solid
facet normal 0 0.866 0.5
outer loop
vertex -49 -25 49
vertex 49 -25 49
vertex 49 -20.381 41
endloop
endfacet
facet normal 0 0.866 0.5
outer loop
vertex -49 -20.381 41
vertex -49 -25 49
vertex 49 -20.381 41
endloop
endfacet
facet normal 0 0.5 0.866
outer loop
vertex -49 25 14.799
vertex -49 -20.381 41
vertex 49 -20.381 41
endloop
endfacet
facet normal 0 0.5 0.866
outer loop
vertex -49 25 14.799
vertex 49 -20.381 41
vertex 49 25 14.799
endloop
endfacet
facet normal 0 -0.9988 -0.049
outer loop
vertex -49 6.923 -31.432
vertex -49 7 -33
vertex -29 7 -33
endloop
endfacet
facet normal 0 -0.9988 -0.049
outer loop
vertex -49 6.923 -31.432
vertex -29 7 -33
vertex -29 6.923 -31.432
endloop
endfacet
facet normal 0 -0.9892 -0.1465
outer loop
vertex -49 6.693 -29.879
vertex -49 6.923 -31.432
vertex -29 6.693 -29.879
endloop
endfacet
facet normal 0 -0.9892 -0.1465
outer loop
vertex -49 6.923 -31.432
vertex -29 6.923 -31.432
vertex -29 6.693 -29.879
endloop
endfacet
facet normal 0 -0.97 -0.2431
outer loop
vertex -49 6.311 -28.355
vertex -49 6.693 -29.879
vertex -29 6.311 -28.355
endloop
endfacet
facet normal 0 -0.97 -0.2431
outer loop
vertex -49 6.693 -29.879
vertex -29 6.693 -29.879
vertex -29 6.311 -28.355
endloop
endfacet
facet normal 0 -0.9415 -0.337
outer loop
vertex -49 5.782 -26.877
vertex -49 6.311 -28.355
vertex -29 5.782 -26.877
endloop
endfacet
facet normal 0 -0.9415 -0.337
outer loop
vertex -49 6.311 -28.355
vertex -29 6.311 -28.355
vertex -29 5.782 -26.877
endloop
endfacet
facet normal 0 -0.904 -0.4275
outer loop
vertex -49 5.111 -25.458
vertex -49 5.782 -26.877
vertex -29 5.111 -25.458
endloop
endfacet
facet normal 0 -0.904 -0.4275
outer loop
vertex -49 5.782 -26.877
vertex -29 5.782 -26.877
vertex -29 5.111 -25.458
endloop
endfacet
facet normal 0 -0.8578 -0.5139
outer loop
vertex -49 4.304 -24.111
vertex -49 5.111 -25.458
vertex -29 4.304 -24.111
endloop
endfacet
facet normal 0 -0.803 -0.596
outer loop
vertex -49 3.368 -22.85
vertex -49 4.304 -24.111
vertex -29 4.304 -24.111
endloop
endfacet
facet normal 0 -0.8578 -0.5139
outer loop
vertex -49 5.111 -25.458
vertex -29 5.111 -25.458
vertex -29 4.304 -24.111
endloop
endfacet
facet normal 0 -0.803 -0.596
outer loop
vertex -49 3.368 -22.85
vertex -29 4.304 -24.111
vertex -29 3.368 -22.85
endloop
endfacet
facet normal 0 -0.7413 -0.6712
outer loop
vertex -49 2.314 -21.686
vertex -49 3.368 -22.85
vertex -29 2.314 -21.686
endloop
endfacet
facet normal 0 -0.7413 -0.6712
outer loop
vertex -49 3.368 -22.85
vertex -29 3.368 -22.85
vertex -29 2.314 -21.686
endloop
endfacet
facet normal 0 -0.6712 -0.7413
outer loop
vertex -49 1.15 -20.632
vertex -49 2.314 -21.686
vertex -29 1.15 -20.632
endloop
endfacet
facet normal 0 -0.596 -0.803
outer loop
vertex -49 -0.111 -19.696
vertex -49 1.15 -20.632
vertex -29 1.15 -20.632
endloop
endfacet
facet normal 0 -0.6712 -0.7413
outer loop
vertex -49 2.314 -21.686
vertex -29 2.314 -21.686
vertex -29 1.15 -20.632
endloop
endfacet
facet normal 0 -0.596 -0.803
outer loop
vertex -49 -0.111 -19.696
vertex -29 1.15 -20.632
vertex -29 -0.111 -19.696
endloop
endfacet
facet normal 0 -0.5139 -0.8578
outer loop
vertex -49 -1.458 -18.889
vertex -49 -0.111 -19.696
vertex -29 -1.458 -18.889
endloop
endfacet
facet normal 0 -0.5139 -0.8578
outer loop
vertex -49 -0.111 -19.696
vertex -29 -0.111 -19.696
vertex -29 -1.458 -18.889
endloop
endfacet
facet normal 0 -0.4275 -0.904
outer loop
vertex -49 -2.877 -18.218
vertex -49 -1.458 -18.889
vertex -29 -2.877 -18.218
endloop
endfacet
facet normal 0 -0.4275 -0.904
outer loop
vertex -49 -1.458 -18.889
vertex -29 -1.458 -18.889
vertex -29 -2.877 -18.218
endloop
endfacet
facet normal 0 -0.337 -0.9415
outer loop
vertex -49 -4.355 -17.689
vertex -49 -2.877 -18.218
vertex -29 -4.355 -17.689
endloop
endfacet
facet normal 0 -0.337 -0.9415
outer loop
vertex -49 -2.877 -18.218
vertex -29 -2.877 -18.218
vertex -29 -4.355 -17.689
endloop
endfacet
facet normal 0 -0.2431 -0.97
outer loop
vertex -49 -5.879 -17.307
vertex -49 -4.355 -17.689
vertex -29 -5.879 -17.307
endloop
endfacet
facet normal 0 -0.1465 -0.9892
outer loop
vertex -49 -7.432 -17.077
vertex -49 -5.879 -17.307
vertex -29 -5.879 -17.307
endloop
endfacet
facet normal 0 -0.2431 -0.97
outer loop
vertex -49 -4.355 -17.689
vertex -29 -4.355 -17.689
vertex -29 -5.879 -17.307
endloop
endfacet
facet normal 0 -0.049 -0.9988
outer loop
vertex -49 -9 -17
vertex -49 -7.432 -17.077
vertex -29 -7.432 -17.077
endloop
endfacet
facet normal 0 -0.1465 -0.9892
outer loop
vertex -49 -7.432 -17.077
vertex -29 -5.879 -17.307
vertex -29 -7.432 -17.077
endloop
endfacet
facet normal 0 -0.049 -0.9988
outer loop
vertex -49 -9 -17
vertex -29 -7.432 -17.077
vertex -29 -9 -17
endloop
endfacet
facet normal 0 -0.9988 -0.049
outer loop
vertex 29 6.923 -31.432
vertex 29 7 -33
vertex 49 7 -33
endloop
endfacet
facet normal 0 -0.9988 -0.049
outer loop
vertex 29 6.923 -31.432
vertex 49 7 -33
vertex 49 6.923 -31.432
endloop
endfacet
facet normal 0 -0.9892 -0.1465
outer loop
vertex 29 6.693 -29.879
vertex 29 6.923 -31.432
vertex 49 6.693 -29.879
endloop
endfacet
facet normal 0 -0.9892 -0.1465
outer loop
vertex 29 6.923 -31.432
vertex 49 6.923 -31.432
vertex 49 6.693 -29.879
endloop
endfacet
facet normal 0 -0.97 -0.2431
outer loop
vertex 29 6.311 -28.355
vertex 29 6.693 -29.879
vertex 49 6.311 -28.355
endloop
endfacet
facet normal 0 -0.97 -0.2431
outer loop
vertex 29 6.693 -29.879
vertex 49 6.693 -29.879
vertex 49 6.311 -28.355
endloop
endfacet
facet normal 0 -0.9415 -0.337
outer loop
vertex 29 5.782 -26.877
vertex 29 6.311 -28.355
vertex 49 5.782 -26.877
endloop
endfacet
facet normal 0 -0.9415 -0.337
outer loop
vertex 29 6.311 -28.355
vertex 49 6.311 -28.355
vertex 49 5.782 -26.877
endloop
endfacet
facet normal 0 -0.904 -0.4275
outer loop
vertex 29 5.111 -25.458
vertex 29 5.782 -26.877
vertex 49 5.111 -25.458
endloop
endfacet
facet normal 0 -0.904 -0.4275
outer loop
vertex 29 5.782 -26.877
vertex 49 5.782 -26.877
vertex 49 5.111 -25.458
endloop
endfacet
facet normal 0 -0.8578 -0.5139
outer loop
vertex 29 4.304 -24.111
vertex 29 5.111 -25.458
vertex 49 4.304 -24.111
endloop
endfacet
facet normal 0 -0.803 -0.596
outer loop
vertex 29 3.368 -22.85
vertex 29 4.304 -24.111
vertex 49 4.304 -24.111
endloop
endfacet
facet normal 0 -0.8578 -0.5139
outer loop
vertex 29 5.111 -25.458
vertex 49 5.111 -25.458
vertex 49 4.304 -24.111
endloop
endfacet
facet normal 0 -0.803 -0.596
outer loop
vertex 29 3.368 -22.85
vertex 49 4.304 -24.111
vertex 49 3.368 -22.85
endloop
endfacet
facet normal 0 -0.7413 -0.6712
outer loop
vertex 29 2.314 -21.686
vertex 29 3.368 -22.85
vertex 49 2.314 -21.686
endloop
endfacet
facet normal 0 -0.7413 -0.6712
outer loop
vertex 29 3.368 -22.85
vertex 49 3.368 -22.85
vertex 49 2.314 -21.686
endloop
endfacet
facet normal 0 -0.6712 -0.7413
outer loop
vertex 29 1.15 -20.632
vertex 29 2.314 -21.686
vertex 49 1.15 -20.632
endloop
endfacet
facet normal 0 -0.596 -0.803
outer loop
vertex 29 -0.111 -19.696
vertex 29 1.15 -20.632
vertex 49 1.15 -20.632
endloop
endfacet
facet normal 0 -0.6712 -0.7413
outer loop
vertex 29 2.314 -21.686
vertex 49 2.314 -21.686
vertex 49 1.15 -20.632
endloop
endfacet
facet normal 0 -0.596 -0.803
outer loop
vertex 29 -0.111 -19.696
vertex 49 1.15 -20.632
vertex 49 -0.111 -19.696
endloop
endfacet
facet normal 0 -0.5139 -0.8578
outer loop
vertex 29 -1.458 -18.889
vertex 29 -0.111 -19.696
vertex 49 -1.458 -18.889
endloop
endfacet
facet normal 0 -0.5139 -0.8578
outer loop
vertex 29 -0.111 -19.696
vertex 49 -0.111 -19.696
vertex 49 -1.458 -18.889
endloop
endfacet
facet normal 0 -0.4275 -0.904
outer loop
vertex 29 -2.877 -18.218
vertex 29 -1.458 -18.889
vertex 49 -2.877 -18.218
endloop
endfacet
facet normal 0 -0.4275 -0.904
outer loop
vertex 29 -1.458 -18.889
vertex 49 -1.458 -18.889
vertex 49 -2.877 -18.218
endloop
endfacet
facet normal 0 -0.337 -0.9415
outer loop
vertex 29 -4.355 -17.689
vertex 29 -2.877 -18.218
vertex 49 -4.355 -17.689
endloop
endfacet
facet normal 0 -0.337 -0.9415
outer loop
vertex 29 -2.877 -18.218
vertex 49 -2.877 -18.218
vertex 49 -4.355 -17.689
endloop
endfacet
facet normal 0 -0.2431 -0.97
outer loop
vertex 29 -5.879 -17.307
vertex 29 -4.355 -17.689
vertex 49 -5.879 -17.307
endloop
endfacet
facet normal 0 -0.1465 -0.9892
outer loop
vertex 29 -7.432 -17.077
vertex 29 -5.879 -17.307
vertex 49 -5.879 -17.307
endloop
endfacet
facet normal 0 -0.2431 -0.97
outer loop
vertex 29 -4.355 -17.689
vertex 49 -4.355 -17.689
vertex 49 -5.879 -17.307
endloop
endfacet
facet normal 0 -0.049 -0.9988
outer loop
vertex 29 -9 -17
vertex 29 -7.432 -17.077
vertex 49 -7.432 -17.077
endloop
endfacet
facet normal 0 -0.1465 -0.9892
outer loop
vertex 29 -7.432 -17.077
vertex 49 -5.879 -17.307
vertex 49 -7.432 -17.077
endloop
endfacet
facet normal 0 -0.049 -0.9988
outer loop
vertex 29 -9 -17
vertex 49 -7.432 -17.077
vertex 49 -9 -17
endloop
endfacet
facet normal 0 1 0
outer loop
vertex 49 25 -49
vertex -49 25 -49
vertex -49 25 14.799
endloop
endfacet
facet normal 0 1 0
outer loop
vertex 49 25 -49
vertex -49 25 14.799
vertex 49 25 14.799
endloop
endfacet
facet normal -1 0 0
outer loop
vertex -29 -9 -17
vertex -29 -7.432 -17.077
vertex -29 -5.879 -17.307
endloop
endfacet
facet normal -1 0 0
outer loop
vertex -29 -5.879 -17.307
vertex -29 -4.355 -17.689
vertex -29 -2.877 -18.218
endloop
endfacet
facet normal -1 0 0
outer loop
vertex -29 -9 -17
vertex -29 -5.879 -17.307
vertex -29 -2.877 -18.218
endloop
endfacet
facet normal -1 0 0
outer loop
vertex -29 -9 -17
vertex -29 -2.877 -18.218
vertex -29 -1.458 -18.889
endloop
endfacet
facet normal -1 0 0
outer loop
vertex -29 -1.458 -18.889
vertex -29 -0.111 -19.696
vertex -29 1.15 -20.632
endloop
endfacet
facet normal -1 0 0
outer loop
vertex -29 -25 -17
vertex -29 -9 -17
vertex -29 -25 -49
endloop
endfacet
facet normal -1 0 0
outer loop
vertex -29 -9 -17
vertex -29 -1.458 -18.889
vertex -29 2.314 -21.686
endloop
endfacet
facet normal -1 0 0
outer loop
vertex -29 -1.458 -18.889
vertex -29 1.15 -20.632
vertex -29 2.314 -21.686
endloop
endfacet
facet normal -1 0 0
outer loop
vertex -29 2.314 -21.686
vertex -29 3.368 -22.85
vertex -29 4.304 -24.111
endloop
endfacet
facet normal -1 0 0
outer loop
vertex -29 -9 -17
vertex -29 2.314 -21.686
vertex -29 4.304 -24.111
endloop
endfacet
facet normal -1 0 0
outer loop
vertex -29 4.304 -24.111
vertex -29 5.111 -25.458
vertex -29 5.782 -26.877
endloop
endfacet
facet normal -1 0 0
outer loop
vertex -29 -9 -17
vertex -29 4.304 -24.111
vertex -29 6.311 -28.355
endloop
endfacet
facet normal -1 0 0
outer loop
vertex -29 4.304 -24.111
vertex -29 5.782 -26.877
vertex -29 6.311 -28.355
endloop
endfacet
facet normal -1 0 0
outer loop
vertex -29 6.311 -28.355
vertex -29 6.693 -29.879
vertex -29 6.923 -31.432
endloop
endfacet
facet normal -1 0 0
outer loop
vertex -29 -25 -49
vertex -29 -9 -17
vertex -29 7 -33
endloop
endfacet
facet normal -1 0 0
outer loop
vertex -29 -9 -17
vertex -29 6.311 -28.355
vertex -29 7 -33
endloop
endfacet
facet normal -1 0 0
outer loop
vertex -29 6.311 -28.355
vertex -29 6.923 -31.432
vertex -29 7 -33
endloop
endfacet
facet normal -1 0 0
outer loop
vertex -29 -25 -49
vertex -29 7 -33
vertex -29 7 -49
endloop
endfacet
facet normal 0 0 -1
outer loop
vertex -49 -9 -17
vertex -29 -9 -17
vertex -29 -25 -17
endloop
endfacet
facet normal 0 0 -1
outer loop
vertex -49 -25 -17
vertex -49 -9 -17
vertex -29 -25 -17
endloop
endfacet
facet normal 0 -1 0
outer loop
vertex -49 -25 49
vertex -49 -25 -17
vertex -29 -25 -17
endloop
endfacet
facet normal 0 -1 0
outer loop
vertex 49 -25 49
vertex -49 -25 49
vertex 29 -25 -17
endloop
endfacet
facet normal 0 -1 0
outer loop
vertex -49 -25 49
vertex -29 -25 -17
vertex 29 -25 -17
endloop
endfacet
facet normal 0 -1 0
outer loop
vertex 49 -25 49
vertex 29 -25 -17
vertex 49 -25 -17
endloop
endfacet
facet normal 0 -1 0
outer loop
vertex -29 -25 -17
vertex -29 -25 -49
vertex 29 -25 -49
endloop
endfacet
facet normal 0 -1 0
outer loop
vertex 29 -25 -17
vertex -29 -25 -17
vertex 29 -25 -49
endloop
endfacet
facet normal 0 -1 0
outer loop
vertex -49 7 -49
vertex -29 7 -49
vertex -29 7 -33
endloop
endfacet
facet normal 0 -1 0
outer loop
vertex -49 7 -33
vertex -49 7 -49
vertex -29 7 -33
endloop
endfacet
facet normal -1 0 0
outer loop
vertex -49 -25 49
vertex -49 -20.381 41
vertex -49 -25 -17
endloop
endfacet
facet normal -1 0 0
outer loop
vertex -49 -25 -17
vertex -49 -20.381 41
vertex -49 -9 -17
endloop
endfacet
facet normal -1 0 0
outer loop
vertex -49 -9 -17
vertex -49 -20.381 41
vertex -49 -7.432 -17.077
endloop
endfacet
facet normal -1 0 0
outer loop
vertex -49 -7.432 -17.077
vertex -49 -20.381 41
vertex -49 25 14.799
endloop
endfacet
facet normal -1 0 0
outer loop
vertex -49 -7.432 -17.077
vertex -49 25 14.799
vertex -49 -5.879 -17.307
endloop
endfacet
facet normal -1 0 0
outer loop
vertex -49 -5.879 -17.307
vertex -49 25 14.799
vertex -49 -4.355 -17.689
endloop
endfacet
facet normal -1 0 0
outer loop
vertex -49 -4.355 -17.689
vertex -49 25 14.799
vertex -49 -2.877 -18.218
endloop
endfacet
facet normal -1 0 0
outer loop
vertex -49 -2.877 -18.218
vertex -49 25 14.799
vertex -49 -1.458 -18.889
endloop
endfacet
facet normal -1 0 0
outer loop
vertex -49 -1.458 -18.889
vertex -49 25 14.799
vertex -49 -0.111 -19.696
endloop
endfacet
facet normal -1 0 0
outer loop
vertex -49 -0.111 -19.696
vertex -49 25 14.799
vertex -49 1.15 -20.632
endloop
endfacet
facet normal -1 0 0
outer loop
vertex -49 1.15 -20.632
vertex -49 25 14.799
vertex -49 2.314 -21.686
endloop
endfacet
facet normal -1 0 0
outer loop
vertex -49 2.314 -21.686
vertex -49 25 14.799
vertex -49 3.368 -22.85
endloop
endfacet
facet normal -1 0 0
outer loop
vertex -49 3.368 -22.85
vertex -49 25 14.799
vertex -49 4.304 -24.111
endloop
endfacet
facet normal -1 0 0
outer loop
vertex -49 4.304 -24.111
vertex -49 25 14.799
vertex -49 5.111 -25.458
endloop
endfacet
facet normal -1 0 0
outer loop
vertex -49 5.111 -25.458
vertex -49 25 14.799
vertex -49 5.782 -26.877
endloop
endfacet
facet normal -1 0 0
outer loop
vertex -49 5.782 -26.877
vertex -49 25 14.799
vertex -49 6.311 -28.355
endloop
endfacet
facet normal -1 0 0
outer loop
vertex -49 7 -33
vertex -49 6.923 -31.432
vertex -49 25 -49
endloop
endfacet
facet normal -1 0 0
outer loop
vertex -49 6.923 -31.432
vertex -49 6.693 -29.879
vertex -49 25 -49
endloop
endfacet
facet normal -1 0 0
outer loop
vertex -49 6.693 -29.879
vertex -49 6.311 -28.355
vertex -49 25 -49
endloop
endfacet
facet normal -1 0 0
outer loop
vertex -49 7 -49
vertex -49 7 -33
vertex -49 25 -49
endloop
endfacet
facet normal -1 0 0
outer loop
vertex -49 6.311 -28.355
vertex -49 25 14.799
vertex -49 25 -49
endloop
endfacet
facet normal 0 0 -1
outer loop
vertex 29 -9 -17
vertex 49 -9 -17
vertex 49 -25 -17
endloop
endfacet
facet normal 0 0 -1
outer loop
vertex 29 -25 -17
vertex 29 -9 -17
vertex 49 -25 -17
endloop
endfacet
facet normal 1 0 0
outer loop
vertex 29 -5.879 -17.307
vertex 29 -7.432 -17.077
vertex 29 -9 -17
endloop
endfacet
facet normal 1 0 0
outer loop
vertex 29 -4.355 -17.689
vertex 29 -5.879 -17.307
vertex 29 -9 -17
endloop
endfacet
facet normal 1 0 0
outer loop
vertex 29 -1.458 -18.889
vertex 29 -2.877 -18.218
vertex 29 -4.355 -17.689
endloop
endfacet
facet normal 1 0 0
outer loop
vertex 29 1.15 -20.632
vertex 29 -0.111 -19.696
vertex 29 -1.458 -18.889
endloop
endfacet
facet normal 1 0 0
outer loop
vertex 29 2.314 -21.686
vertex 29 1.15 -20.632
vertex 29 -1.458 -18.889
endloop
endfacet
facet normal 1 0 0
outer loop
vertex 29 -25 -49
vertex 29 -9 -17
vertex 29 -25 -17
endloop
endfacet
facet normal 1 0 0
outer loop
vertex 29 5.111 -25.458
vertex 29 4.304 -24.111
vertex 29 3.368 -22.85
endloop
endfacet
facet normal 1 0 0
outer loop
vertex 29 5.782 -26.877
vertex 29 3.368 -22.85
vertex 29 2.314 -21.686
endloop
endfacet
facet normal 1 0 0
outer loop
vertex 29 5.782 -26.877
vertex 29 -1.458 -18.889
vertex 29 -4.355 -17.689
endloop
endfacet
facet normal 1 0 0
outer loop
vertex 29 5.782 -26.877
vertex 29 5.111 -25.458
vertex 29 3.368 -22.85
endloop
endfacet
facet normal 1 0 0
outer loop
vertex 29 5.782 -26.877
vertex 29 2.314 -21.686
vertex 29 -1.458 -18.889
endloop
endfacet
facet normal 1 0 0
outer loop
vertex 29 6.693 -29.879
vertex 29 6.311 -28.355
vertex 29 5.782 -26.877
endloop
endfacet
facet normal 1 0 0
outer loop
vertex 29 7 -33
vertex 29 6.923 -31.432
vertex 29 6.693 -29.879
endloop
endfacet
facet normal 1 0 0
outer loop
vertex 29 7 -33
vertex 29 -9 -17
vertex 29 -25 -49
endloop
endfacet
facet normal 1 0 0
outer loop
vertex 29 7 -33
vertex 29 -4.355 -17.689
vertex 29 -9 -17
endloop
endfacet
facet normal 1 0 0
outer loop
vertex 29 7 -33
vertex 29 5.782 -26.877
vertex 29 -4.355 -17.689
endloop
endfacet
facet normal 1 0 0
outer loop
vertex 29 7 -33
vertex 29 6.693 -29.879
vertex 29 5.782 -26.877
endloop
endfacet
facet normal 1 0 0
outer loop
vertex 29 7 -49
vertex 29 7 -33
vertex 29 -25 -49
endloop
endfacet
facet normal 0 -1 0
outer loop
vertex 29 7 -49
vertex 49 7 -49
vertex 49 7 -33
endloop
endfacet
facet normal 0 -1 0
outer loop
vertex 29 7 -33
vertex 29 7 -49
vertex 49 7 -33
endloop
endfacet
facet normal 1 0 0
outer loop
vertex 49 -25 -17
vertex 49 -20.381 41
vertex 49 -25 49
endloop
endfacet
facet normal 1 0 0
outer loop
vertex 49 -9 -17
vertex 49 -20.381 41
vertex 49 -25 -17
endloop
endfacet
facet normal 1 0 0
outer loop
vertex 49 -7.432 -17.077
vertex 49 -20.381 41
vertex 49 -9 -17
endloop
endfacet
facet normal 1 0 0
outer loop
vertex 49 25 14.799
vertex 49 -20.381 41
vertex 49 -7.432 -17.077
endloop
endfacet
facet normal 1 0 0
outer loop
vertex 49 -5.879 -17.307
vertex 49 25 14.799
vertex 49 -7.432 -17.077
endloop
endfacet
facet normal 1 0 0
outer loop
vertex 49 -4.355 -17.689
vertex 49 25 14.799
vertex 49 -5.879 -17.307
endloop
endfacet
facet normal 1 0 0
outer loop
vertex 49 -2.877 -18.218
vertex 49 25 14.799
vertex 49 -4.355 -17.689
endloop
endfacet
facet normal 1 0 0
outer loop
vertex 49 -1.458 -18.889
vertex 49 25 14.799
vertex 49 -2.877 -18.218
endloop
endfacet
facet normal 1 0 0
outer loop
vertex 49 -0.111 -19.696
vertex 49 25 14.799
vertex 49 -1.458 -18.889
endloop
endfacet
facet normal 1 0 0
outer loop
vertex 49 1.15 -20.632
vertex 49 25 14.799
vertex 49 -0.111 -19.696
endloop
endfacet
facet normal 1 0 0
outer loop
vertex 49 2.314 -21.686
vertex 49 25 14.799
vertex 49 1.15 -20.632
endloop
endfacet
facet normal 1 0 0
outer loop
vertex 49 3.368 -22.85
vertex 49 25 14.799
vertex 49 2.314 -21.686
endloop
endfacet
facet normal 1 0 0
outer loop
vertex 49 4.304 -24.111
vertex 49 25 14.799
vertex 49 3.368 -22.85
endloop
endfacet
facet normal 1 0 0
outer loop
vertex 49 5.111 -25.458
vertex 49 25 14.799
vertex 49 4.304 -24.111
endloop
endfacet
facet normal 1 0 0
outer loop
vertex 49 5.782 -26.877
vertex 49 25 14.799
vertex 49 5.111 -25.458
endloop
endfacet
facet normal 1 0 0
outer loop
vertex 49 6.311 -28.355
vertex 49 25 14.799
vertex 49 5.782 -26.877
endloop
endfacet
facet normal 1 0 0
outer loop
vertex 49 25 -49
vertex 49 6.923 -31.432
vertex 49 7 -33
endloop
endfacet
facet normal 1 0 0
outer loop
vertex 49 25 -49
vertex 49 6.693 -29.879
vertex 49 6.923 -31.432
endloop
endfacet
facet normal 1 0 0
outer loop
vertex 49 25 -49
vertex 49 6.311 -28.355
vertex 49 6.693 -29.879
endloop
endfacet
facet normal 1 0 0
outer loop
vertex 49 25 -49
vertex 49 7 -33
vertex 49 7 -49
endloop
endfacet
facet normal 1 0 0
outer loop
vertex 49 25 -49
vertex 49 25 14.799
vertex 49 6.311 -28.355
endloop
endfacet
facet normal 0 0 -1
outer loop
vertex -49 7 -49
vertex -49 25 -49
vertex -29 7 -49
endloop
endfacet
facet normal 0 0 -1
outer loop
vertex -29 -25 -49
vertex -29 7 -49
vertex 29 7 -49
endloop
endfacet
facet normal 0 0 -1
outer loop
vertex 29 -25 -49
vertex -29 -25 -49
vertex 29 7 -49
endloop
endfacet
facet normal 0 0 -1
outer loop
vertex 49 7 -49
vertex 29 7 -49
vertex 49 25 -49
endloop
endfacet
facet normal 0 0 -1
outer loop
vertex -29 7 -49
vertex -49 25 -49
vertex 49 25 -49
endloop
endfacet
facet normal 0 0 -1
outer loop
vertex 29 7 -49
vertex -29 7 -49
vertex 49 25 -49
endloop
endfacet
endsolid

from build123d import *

# Parameters (mm, degrees)
ESBO_O1_W                  = 98
ESBO_O1_H                  = 98
RESSALTO_EXTRUS_O1_DEPTH   = 25
CORTE_EXTRUS_O4_DEPTH      = 74.668174947
CORTE_EXTRUS_O4_DEPTH_BACK = 74.668174947
CORTE_EXTRUS_O10_START     = 49
CORTE_EXTRUS_O10_DEPTH     = 20
CORTE_EXTRUS_O11_START     = -29
CORTE_EXTRUS_O11_DEPTH     = 20


with BuildPart() as part:
    # Esboço1 → Ressalto-extrusão1 (new, symmetric)
    with BuildSketch(Plane(origin=(0, 0, 0), x_dir=(1, 0, 0), z_dir=(0, 1, 0))):
        Rectangle(ESBO_O1_W, ESBO_O1_H)
    extrude(amount=RESSALTO_EXTRUS_O1_DEPTH, both=True)

    # Esboço2 → Corte-extrusão4 (cut, two sides: drawn at the far end of the back side and taken through both)
    with BuildSketch(Plane(origin=(0, 0, 0), x_dir=(0, 0, -1), z_dir=(1, 0, 0)).offset(-CORTE_EXTRUS_O4_DEPTH_BACK)):
        Polygon((-49, 25), (-49, -25), (-41, -20.381197846), (-14.799153207, 25), align=None)
    extrude(amount=CORTE_EXTRUS_O4_DEPTH + CORTE_EXTRUS_O4_DEPTH_BACK, mode=Mode.SUBTRACT)

    # Esboço7 → Corte-extrusão10 (cut)
    with BuildSketch(Plane(origin=(0, 0, 0), x_dir=(0, 0, -1), z_dir=(1, 0, 0)).offset(CORTE_EXTRUS_O10_START)):
        with BuildLine():
            ThreePointArc((33, -25), (44.313708499, -20.313708499), (49, -9))
            Line((49, -9), (33, -9))
            Line((33, -9), (33, -25))
        make_face()
        with BuildLine():
            ThreePointArc((33, 7), (44.313708499, 2.313708499), (49, -9))
            Line((49, -9), (49, 7))
            Line((49, 7), (33, 7))
        make_face()
        with BuildLine():
            Line((33, -9), (49, -9))
            ThreePointArc((49, -9), (44.313708499, 2.313708499), (33, 7))
            Line((33, 7), (33, -9))
        make_face()
        with BuildLine():
            Line((49, -25), (49, -9))
            ThreePointArc((49, -9), (44.313708499, -20.313708499), (33, -25))
            Line((33, -25), (49, -25))
        make_face()
        with BuildLine():
            Line((33, -25), (33, -9))
            Line((33, -9), (17, -9))
            ThreePointArc((17, -9), (21.686291501, -20.313708499), (33, -25))
        make_face()
        with BuildLine():
            Line((17, -9), (33, -9))
            Line((33, -9), (33, 7))
            ThreePointArc((33, 7), (21.686291501, 2.313708499), (17, -9))
        make_face()
        with BuildLine():
            Line((17, -25), (33, -25))
            ThreePointArc((33, -25), (21.686291501, -20.313708499), (17, -9))
            Line((17, -9), (17, -25))
        make_face()
    extrude(amount=-CORTE_EXTRUS_O10_DEPTH, mode=Mode.SUBTRACT)

    # Esboço9 → Corte-extrusão11 (cut)
    with BuildSketch(Plane(origin=(0, 0, 0), x_dir=(0, 0, -1), z_dir=(1, 0, 0)).offset(CORTE_EXTRUS_O11_START)):
        with BuildLine():
            Line((33, -25), (49, -25))
            Line((49, -25), (49, -9))
            ThreePointArc((49, -9), (44.313708499, -20.313708499), (33, -25))
        make_face()
        with BuildLine():
            ThreePointArc((17, -9), (21.686291501, -20.313708499), (33, -25))
            Line((33, -25), (33, -9))
            Line((33, -9), (17, -9))
        make_face()
        with BuildLine():
            Line((17, -25), (33, -25))
            ThreePointArc((33, -25), (21.686291501, -20.313708499), (17, -9))
            Line((17, -9), (17, -25))
        make_face()
        with BuildLine():
            Line((33, -9), (33, -25))
            ThreePointArc((33, -25), (44.313708499, -20.313708499), (49, -9))
            Line((49, -9), (33, -9))
        make_face()
        with BuildLine():
            ThreePointArc((33, 7), (44.313708499, 2.313708499), (49, -9))
            Line((49, -9), (49, 7))
            Line((49, 7), (33, 7))
        make_face()
        with BuildLine():
            Line((33, -9), (49, -9))
            ThreePointArc((49, -9), (44.313708499, 2.313708499), (33, 7))
            Line((33, 7), (33, -9))
        make_face()
        with BuildLine():
            Line((17, -9), (33, -9))
            Line((33, -9), (33, 7))
            ThreePointArc((33, 7), (21.686291501, 2.313708499), (17, -9))
        make_face()
    extrude(amount=-CORTE_EXTRUS_O11_DEPTH, mode=Mode.SUBTRACT)


solid = part.part
